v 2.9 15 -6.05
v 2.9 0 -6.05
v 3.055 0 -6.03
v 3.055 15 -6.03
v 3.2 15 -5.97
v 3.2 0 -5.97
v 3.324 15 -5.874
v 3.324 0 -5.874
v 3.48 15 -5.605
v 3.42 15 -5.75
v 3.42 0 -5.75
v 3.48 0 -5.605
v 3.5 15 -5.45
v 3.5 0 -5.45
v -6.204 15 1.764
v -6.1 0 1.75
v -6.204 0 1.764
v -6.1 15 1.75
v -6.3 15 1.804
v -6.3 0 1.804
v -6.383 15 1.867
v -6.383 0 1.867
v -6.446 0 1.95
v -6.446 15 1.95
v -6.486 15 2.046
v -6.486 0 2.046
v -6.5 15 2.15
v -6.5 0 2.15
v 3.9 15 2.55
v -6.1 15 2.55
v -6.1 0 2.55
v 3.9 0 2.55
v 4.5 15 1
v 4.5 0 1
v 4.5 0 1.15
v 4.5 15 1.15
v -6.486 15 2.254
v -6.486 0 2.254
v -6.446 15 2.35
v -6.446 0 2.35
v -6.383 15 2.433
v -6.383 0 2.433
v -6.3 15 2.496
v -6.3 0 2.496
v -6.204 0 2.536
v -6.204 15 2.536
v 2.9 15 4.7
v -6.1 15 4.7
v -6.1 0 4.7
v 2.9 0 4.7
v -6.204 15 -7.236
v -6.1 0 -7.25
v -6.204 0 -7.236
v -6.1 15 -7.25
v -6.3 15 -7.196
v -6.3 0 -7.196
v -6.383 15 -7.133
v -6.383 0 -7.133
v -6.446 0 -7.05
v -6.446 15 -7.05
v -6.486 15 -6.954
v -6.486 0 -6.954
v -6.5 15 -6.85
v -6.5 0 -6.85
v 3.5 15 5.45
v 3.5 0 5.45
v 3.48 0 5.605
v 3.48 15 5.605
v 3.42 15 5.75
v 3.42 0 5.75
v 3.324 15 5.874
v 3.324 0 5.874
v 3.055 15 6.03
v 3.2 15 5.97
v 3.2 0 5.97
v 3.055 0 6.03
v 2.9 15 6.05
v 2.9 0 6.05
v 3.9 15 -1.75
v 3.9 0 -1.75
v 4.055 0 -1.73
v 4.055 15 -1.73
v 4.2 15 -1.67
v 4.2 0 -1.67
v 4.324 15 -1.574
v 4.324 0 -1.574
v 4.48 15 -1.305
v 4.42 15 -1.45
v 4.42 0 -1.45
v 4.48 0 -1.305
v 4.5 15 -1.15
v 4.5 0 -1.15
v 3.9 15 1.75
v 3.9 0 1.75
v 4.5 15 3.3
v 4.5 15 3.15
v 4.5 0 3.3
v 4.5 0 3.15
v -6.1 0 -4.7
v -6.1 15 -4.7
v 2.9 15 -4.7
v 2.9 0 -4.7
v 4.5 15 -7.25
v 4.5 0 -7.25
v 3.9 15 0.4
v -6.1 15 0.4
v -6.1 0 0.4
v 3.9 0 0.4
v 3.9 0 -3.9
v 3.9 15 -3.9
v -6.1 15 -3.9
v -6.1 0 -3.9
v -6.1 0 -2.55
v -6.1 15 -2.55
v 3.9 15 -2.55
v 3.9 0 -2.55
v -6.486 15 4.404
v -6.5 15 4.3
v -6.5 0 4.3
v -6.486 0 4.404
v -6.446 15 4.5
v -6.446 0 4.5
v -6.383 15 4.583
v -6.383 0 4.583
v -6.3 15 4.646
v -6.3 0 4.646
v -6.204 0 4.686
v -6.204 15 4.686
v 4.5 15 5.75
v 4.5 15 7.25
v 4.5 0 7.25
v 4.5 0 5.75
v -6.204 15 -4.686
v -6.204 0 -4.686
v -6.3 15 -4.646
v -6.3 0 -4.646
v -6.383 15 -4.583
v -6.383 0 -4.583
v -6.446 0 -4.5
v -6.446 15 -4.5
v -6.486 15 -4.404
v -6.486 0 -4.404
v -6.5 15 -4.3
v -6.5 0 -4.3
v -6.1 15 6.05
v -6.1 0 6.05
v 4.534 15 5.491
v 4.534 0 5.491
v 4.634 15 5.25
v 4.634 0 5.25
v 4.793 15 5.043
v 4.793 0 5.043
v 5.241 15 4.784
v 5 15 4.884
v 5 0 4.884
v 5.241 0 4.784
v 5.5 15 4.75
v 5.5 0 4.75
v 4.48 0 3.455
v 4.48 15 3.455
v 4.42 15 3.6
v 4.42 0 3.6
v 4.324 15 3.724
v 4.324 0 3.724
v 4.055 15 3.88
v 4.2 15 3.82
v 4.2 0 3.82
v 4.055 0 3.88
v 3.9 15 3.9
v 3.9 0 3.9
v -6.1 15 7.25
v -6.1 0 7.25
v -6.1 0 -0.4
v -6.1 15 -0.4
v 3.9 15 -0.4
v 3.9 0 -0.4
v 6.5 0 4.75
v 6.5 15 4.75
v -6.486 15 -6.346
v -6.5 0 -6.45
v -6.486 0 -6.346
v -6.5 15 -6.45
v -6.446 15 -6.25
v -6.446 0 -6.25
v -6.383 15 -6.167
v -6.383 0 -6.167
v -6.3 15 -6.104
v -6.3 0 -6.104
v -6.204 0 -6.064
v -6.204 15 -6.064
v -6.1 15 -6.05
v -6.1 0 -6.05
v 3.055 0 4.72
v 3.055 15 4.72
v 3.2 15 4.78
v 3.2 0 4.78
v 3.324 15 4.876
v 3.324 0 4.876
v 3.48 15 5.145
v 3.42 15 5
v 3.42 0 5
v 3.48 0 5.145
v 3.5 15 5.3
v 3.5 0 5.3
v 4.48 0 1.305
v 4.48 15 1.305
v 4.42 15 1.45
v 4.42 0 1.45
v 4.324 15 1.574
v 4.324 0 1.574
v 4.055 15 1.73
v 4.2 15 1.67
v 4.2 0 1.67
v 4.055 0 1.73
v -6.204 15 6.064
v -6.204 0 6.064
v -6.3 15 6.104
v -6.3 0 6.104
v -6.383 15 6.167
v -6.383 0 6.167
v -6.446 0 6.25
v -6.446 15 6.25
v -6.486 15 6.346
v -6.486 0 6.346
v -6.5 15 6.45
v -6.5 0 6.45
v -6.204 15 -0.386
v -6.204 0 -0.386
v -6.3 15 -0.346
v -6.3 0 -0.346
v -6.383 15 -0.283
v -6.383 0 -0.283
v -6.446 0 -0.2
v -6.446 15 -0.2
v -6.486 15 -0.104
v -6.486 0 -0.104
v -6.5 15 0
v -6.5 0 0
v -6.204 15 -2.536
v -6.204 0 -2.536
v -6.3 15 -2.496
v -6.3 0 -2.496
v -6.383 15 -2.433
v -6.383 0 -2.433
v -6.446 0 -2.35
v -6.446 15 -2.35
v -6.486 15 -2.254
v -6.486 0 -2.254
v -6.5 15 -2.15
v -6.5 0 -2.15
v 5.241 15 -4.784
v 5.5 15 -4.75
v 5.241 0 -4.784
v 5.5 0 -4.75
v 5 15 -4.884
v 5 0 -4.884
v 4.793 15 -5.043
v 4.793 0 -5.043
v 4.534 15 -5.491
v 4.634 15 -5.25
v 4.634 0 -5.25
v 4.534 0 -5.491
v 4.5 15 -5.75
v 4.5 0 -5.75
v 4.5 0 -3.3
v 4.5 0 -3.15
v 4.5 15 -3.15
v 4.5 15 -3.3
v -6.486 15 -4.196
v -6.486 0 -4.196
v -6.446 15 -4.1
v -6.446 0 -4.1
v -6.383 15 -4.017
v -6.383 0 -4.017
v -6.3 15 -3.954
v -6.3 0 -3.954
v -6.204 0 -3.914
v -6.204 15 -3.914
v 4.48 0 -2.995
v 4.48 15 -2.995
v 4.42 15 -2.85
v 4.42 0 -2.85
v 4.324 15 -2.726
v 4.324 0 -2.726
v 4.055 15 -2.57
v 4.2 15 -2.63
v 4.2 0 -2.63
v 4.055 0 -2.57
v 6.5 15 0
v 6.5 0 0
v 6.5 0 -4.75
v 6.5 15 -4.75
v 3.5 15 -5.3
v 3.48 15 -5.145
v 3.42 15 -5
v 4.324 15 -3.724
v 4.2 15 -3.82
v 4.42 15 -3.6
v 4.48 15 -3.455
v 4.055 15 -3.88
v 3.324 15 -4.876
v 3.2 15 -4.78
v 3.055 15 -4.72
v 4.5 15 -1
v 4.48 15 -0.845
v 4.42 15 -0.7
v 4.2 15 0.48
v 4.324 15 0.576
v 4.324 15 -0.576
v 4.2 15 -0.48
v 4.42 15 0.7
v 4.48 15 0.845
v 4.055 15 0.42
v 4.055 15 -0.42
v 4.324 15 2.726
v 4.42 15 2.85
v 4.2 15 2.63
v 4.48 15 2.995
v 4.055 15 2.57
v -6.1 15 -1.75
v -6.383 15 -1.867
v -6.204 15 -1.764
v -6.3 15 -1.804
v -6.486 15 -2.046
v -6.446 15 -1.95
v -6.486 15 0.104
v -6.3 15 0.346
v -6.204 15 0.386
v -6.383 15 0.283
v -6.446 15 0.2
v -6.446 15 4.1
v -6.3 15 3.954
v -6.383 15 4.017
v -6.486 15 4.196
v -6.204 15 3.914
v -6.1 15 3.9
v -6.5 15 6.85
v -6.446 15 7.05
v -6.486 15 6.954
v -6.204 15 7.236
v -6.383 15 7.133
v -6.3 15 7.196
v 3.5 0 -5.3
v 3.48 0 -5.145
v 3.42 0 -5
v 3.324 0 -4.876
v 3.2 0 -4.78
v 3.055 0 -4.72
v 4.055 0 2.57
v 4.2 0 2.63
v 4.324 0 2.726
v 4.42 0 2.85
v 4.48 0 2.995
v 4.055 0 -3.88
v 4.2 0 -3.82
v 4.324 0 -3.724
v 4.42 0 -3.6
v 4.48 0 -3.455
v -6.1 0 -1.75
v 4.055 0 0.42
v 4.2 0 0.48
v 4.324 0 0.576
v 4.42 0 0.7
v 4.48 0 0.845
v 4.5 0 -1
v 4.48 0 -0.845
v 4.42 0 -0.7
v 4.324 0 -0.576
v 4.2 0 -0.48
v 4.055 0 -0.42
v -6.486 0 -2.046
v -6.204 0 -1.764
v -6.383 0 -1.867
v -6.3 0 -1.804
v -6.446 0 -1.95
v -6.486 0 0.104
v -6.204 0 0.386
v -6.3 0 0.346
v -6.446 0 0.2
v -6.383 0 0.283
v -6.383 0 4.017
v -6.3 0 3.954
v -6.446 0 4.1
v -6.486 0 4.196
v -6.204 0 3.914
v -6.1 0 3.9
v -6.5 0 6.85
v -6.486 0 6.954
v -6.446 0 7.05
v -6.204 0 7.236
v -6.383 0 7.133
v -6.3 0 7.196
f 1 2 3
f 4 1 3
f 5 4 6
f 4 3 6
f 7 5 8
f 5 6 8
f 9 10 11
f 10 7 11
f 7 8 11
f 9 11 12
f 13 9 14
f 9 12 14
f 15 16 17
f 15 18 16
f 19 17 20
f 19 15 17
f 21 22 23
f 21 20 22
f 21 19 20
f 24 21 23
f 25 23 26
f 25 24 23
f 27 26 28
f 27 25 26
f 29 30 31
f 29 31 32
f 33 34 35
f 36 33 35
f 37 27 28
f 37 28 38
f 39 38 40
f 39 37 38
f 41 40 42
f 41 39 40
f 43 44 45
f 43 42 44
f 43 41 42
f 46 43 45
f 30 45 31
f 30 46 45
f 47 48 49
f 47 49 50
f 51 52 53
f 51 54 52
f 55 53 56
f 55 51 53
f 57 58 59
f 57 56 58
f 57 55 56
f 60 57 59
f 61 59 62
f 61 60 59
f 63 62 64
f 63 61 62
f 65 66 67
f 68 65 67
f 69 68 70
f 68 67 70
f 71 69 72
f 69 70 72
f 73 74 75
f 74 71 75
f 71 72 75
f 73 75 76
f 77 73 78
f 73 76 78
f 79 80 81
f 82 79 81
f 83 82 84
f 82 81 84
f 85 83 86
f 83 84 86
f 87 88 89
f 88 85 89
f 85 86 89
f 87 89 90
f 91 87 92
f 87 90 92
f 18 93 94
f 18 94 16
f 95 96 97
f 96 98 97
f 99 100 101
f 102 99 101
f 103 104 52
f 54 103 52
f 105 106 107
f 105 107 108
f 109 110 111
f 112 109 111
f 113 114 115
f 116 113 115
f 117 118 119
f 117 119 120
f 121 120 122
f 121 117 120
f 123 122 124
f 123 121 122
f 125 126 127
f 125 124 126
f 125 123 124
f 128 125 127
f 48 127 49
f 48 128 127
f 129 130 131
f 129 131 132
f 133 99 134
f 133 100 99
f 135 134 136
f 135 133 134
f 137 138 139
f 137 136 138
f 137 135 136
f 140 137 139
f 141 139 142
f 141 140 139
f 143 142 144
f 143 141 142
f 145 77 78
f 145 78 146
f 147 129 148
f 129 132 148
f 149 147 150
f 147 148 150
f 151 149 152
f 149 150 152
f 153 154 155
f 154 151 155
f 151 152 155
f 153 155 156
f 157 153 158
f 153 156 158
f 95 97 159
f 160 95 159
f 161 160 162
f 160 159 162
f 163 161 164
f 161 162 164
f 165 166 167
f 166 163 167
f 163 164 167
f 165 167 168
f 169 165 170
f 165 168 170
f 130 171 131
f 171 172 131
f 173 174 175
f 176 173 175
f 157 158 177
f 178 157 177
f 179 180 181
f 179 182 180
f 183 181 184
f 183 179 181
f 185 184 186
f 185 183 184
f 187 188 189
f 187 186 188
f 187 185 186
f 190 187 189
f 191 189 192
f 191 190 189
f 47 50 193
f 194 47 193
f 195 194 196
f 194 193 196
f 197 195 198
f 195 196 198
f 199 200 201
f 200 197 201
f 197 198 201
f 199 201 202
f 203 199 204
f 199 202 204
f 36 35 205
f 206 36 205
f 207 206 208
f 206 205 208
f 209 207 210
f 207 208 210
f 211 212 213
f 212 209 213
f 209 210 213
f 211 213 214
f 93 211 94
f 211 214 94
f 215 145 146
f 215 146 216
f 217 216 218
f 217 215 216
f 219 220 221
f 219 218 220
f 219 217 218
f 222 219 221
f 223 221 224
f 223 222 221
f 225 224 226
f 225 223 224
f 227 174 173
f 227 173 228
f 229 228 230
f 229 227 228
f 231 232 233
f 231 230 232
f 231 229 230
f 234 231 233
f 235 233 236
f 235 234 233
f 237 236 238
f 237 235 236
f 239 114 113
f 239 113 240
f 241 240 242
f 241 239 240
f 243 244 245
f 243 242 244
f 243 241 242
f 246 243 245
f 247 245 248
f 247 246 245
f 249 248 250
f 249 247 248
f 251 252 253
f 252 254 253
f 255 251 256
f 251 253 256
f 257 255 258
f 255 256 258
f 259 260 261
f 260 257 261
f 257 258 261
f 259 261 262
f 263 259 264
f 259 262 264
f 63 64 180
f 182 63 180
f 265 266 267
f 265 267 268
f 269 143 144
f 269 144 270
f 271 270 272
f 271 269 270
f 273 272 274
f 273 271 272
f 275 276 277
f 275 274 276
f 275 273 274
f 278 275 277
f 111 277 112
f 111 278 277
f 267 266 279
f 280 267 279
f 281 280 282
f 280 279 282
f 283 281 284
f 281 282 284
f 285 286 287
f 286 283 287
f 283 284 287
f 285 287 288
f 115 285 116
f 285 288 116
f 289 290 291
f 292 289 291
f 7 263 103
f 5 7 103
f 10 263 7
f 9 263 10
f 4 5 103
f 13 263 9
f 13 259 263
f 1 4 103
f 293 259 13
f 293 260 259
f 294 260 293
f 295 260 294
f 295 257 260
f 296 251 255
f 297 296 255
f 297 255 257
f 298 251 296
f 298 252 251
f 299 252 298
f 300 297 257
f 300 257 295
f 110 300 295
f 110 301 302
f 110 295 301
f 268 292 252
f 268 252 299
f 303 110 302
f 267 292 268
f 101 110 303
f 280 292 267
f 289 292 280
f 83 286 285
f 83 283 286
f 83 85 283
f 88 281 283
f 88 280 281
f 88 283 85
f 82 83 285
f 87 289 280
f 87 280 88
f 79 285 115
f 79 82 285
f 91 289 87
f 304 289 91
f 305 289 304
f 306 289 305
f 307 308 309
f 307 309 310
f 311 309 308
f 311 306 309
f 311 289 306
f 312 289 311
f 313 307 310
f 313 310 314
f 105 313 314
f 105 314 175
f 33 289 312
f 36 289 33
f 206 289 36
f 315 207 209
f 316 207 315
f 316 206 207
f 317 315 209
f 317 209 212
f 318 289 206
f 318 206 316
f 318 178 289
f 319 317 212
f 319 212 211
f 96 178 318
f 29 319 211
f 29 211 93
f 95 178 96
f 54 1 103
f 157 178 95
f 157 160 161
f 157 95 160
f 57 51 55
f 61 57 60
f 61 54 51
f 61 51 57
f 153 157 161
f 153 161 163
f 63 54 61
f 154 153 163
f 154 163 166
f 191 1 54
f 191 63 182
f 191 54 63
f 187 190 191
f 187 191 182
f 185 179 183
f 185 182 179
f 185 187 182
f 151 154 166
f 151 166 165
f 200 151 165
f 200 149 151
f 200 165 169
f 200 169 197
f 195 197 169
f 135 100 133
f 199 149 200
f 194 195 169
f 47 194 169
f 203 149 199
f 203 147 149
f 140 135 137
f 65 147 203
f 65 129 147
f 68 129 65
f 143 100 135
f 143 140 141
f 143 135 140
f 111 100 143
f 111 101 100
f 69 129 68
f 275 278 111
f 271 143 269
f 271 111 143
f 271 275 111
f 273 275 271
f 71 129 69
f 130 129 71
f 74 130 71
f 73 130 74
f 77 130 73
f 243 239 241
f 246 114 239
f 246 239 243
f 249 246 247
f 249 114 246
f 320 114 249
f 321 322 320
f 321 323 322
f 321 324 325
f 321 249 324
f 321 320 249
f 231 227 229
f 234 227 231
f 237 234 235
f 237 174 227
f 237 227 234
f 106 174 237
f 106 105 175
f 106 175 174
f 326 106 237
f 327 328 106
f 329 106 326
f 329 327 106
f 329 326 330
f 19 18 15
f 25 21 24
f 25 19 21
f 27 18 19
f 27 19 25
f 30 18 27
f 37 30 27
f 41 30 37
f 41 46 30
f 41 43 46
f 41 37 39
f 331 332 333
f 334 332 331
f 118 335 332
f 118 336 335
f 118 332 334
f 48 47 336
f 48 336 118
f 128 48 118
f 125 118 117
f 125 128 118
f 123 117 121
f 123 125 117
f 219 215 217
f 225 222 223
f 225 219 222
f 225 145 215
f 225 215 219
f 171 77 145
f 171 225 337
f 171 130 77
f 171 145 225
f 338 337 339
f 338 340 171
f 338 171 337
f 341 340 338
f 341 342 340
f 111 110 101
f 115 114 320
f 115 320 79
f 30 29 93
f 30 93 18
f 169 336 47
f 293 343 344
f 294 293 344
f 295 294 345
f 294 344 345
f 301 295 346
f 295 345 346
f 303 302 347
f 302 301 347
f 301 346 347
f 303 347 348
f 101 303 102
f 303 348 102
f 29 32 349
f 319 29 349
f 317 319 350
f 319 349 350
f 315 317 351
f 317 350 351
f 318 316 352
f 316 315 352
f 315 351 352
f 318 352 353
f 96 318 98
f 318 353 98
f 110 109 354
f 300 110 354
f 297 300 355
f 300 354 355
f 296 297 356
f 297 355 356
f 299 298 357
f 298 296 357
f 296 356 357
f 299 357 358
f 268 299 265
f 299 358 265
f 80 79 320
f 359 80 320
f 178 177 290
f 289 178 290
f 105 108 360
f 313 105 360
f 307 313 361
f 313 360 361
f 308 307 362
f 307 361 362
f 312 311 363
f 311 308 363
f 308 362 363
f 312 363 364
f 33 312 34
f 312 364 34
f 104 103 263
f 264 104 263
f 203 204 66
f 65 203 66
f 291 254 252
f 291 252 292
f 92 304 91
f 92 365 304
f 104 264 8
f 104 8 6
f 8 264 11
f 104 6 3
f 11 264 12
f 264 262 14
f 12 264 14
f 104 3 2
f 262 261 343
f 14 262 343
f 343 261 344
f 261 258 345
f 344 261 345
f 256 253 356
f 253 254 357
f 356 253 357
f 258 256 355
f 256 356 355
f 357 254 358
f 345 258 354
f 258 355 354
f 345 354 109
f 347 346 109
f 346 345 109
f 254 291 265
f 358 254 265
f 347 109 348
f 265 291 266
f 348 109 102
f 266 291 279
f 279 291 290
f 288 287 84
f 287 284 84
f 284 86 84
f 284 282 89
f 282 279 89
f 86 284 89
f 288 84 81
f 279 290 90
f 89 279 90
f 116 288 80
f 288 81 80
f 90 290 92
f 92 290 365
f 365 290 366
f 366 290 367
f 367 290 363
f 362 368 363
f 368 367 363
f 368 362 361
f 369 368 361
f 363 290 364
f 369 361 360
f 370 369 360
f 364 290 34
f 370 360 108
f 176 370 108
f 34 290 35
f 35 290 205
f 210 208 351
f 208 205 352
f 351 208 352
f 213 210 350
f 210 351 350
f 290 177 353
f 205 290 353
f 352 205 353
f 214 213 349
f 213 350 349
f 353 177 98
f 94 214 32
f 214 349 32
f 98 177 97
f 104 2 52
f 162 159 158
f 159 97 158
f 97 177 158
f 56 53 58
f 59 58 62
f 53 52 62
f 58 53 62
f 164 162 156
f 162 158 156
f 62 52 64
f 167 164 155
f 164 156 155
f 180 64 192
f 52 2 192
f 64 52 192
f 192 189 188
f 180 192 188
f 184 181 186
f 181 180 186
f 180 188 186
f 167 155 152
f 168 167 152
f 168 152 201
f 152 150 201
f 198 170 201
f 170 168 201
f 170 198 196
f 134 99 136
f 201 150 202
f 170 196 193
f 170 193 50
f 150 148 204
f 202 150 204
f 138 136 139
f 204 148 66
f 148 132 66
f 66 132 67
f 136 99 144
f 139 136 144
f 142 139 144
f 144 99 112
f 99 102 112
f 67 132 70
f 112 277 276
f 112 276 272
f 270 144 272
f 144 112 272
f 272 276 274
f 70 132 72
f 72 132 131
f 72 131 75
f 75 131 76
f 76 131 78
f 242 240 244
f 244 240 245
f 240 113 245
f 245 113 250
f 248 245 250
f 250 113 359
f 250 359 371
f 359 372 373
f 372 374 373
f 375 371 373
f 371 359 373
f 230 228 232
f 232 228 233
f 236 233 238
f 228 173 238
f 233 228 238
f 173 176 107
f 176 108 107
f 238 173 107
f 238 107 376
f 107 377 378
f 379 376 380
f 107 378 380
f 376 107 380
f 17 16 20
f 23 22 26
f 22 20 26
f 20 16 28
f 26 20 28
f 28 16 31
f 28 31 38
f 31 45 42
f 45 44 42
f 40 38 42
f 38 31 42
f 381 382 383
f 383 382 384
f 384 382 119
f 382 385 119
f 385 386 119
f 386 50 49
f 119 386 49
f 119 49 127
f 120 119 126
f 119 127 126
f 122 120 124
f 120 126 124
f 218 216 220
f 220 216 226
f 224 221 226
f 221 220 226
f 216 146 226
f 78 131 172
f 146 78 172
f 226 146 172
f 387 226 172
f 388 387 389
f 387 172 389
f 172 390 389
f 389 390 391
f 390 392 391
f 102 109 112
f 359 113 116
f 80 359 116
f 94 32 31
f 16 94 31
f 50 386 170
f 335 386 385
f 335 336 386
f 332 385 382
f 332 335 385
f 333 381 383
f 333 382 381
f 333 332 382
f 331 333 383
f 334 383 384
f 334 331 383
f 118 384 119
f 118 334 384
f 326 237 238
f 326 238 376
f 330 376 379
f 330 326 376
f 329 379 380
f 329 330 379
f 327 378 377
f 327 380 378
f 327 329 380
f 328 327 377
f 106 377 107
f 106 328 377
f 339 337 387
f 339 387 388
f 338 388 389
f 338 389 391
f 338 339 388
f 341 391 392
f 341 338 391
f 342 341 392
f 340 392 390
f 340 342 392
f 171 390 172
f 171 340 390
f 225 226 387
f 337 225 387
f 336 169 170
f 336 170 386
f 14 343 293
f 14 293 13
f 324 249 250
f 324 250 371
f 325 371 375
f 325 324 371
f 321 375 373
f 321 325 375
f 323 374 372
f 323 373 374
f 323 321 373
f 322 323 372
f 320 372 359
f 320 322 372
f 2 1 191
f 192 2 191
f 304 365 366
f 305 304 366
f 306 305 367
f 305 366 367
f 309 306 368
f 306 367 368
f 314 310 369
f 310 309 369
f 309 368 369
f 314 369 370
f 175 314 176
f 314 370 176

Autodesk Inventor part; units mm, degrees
ref_plane "YZ Plane" through (0, 0, 0) normal (1, 0, 0) x (0, 1, 0)
ref_plane "XZ Plane" through (0, 0, 0) normal (0, 1, 0) x (-1, 0, 0)
ref_plane "XY Plane" through (0, 0, 0) normal (0, 0, 1) x (1, 0, 0)
sketch "Skizze1" plane through (0, 0, 0) normal (0, 1, 0) x (-1, 0, 0)
  line L0 (6.5, 7.25) -> (-6.5, 7.25)
  line L1 (-6.5, 7.25) -> (-6.5, -7.25)
  line L2 (-6.5, -7.25) -> (6.5, -7.25)
  line L3 (6.5, -7.25) -> (6.5, 7.25)
  line L4 (6.5, 7.25) -> (-6.5, -7.25) construction
  line L5 (-6.5, 7.25) -> (6.5, -7.25) construction
  line L6 (-6.5, -7.25) -> (-4.5, -7.25)
  line L7 (-4.5, -7.25) -> (-4.5, -5.75)
  line L8 (-5.5, -4.75) -> (-6.5, -4.75)
  line L9 (-6.5, -4.75) -> (-6.5, -7.25)
  arc A0 (-4.5, -5.75) -> (-5.5, -4.75) centre (-5.5, -5.75) ccw
  line L10 (-6.5, 0) -> (-5.3357, 0)
  line L11 (6.5, -4.7) -> (-2.9, -4.7)
  line L12 (-3.5, -5.3) -> (-3.5, -5.45)
  line L13 (-2.9, -6.05) -> (6.5, -6.05)
  line L14 (6.5, -6.05) -> (6.5, -4.7)
  line L15 (6.5, -2.55) -> (-3.9, -2.55)
  line L16 (-4.5, -3.15) -> (-4.5, -3.3)
  line L17 (-3.9, -3.9) -> (6.5, -3.9)
  line L18 (6.5, -3.9) -> (6.5, -2.55)
  line L19 (6.5, -0.4) -> (-3.9, -0.4)
  line L20 (-4.5, -1) -> (-4.5, -1.15)
  line L21 (-3.9, -1.75) -> (6.5, -1.75)
  line L22 (6.5, -1.75) -> (6.5, -0.4)
  line L23 (-4.5, 7.25) -> (-4.5, 5.75)
  line L24 (-5.5, 4.75) -> (-6.5, 4.75)
  arc A1 (-5.5, 4.75) -> (-4.5, 5.75) centre (-5.5, 5.75) ccw
  line L25 (6.5, 4.7) -> (-2.9, 4.7)
  line L26 (-3.5, 5.3) -> (-3.5, 5.45)
  line L27 (-2.9, 6.05) -> (6.5, 6.05)
  line L28 (6.5, 2.55) -> (-3.9, 2.55)
  line L29 (-4.5, 3.15) -> (-4.5, 3.3)
  line L30 (-3.9, 3.9) -> (6.5, 3.9)
  line L31 (6.5, 0.4) -> (-3.9, 0.4)
  line L32 (-4.5, 1) -> (-4.5, 1.15)
  line L33 (-3.9, 1.75) -> (6.5, 1.75)
  arc A2 (-2.9, 6.05) -> (-3.5, 5.45) centre (-2.9, 5.45) ccw
  arc A3 (-3.5, 5.3) -> (-2.9, 4.7) centre (-2.9, 5.3) ccw
  arc A4 (-3.9, 3.9) -> (-4.5, 3.3) centre (-3.9, 3.3) ccw
  arc A5 (-4.5, 3.15) -> (-3.9, 2.55) centre (-3.9, 3.15) ccw
  arc A6 (-3.9, 1.75) -> (-4.5, 1.15) centre (-3.9, 1.15) ccw
  arc A7 (-4.5, 1) -> (-3.9, 0.4) centre (-3.9, 1) ccw
  arc A8 (-3.9, -0.4) -> (-4.5, -1) centre (-3.9, -1) ccw
  arc A9 (-4.5, -1.15) -> (-3.9, -1.75) centre (-3.9, -1.15) ccw
  arc A10 (-3.9, -2.55) -> (-4.5, -3.15) centre (-3.9, -3.15) ccw
  arc A11 (-4.5, -3.3) -> (-3.9, -3.9) centre (-3.9, -3.3) ccw
  arc A12 (-2.9, -4.7) -> (-3.5, -5.3) centre (-2.9, -5.3) ccw
  arc A13 (-3.5, -5.45) -> (-2.9, -6.05) centre (-2.9, -5.45) ccw
  point P0 (0, 0)
  point P1 (-4.5, -4.75)
  point P2 (-3.5, -6.05)
  point P3 (-3.5, -4.7)
  point P4 (-4.5, -3.9)
  point P5 (-4.5, -2.55)
  point P6 (-4.5, -1.75)
  point P7 (-4.5, -0.4)
  point P8 (-3.5, 6.05)
  point P9 (-3.5, 4.7)
  point P10 (-4.5, 3.9)
  point P11 (-4.5, 2.55)
  point P12 (-4.5, 1.75)
  point P13 (-4.5, 0.4)
  point P14 (6.5, -3.9)
  point P15 (6.5, -1.75)
  point P16 (6.5, 1.75)
  dimension "d0" = 13
  dimension "d1" = 14.5
  dimension "d2" = 2
  dimension "d3" = 2.5
  dimension "d4" = 1
  dimension "d5" = 10
  dimension "d6" = 1.35
  dimension "d7" = 11
  dimension "d8" = 1.35
  dimension "d9" = 1.2
  dimension "d10" = 0.8
  dimension "d11" = 11
  dimension "d12" = 1.35
  dimension "d13" = 0.8
  dimension "d14" = 0.8
  dimension "d15" = 0.6
extrude "Extrusion1" add sketch "Skizze1" along normal blind 15 contours L3 L27 A2 L26 A3 L25 L30 A4 L29 A5 L28 L33 A6 L32 A7 L31 L19 A8 L20 A9 L21 L15 A10 L16 A11 L17 L11 A12 L12 A13 L13 L2 L7 A0 L8 L1 L24 A1 L23 L0
fillet "Rundung1" radius 0.4 14 edges at (-6.5, 7.5, 4.7) (-6.5, 7.5, 3.9) (-6.5, 7.5, 2.55) (-6.5, 7.5, 1.75) (-6.5, 7.5, 0.4) (-6.5, 7.5, -0.4) (-6.5, 7.5, -1.75) (-6.5, 7.5, -2.55) (-6.5, 7.5, -3.9) (-6.5, 7.5, -4.7) (-6.5, 7.5, 7.25) (-6.5, 7.5, 6.05) (-6.5, 7.5, -6.05) (-6.5, 7.5, -7.25)
equation "\"d6\" = d8"
equation "\"d13\" = d10"
properties part number "Heatsink5160Pro"
